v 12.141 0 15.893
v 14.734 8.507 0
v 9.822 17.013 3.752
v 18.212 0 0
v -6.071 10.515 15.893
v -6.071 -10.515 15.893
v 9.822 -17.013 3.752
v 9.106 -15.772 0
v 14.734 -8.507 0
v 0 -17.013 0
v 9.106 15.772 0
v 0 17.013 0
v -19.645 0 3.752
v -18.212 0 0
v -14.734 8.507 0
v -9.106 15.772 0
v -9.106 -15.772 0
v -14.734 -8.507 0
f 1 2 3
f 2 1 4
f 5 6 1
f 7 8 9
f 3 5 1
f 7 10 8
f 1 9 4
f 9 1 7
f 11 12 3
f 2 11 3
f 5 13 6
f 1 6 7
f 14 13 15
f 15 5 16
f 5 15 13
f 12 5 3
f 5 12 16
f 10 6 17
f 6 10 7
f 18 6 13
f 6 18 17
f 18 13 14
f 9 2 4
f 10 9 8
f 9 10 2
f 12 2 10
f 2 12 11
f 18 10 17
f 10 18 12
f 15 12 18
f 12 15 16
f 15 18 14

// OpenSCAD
//!OpenSCAD

r = 20;
sideZ = r / sqrt(5);
sideX = 2 * sideZ;

icosaVerteces = [
    [0, 0, r], // 0 = top vertex
    [cos(0)*sideX, sin(0)*sideX, sideZ], // 1 = x-most vertex, top layer
    [cos(72)*sideX, sin(72)*sideX, sideZ], // 2
    [cos(144)*sideX, sin(144)*sideX, sideZ], // 3
    [cos(216)*sideX, sin(216)*sideX, sideZ], // 4
    [cos(288)*sideX, sin(288)*sideX, sideZ], // 5
    [cos(36)*sideX, sin(36)*sideX, -sideZ], // 6 = bottom layer
    [cos(108)*sideX, sin(108)*sideX, -sideZ], // 7
    [cos(180)*sideX, sin(180)*sideX, -sideZ], // 8
    [cos(252)*sideX, sin(252)*sideX, -sideZ], // 9
    [cos(324)*sideX, sin(324)*sideX, -sideZ], // 10
    [0, 0, -r] // 11 = bottom vertex
];

icosaFaces = [
    // top 5
    [2, 1, 0],
    [3, 2, 0],
    [4, 3, 0],
    [5, 4, 0],
    [1, 5, 0],
    // middle 10
    [1, 2, 6], [7, 6, 2],
    [2, 3, 7], [8, 7, 3],
    [3, 4, 8], [9, 8, 4],
    [4, 5, 9], [10, 9, 5],
    [5, 1, 10], [6, 10, 1],
    // bottom 5
    [6, 7, 11],
    [7, 8, 11],
    [8, 9, 11],
    [9, 10, 11],
    [10, 6, 11]
];

difference() {
    rotate([0, atan(3 - sqrt(5)), 0])
        polyhedron(points = icosaVerteces, faces = icosaFaces);
    translate([-r, -r, -2*r]) cube(2*r);
}
